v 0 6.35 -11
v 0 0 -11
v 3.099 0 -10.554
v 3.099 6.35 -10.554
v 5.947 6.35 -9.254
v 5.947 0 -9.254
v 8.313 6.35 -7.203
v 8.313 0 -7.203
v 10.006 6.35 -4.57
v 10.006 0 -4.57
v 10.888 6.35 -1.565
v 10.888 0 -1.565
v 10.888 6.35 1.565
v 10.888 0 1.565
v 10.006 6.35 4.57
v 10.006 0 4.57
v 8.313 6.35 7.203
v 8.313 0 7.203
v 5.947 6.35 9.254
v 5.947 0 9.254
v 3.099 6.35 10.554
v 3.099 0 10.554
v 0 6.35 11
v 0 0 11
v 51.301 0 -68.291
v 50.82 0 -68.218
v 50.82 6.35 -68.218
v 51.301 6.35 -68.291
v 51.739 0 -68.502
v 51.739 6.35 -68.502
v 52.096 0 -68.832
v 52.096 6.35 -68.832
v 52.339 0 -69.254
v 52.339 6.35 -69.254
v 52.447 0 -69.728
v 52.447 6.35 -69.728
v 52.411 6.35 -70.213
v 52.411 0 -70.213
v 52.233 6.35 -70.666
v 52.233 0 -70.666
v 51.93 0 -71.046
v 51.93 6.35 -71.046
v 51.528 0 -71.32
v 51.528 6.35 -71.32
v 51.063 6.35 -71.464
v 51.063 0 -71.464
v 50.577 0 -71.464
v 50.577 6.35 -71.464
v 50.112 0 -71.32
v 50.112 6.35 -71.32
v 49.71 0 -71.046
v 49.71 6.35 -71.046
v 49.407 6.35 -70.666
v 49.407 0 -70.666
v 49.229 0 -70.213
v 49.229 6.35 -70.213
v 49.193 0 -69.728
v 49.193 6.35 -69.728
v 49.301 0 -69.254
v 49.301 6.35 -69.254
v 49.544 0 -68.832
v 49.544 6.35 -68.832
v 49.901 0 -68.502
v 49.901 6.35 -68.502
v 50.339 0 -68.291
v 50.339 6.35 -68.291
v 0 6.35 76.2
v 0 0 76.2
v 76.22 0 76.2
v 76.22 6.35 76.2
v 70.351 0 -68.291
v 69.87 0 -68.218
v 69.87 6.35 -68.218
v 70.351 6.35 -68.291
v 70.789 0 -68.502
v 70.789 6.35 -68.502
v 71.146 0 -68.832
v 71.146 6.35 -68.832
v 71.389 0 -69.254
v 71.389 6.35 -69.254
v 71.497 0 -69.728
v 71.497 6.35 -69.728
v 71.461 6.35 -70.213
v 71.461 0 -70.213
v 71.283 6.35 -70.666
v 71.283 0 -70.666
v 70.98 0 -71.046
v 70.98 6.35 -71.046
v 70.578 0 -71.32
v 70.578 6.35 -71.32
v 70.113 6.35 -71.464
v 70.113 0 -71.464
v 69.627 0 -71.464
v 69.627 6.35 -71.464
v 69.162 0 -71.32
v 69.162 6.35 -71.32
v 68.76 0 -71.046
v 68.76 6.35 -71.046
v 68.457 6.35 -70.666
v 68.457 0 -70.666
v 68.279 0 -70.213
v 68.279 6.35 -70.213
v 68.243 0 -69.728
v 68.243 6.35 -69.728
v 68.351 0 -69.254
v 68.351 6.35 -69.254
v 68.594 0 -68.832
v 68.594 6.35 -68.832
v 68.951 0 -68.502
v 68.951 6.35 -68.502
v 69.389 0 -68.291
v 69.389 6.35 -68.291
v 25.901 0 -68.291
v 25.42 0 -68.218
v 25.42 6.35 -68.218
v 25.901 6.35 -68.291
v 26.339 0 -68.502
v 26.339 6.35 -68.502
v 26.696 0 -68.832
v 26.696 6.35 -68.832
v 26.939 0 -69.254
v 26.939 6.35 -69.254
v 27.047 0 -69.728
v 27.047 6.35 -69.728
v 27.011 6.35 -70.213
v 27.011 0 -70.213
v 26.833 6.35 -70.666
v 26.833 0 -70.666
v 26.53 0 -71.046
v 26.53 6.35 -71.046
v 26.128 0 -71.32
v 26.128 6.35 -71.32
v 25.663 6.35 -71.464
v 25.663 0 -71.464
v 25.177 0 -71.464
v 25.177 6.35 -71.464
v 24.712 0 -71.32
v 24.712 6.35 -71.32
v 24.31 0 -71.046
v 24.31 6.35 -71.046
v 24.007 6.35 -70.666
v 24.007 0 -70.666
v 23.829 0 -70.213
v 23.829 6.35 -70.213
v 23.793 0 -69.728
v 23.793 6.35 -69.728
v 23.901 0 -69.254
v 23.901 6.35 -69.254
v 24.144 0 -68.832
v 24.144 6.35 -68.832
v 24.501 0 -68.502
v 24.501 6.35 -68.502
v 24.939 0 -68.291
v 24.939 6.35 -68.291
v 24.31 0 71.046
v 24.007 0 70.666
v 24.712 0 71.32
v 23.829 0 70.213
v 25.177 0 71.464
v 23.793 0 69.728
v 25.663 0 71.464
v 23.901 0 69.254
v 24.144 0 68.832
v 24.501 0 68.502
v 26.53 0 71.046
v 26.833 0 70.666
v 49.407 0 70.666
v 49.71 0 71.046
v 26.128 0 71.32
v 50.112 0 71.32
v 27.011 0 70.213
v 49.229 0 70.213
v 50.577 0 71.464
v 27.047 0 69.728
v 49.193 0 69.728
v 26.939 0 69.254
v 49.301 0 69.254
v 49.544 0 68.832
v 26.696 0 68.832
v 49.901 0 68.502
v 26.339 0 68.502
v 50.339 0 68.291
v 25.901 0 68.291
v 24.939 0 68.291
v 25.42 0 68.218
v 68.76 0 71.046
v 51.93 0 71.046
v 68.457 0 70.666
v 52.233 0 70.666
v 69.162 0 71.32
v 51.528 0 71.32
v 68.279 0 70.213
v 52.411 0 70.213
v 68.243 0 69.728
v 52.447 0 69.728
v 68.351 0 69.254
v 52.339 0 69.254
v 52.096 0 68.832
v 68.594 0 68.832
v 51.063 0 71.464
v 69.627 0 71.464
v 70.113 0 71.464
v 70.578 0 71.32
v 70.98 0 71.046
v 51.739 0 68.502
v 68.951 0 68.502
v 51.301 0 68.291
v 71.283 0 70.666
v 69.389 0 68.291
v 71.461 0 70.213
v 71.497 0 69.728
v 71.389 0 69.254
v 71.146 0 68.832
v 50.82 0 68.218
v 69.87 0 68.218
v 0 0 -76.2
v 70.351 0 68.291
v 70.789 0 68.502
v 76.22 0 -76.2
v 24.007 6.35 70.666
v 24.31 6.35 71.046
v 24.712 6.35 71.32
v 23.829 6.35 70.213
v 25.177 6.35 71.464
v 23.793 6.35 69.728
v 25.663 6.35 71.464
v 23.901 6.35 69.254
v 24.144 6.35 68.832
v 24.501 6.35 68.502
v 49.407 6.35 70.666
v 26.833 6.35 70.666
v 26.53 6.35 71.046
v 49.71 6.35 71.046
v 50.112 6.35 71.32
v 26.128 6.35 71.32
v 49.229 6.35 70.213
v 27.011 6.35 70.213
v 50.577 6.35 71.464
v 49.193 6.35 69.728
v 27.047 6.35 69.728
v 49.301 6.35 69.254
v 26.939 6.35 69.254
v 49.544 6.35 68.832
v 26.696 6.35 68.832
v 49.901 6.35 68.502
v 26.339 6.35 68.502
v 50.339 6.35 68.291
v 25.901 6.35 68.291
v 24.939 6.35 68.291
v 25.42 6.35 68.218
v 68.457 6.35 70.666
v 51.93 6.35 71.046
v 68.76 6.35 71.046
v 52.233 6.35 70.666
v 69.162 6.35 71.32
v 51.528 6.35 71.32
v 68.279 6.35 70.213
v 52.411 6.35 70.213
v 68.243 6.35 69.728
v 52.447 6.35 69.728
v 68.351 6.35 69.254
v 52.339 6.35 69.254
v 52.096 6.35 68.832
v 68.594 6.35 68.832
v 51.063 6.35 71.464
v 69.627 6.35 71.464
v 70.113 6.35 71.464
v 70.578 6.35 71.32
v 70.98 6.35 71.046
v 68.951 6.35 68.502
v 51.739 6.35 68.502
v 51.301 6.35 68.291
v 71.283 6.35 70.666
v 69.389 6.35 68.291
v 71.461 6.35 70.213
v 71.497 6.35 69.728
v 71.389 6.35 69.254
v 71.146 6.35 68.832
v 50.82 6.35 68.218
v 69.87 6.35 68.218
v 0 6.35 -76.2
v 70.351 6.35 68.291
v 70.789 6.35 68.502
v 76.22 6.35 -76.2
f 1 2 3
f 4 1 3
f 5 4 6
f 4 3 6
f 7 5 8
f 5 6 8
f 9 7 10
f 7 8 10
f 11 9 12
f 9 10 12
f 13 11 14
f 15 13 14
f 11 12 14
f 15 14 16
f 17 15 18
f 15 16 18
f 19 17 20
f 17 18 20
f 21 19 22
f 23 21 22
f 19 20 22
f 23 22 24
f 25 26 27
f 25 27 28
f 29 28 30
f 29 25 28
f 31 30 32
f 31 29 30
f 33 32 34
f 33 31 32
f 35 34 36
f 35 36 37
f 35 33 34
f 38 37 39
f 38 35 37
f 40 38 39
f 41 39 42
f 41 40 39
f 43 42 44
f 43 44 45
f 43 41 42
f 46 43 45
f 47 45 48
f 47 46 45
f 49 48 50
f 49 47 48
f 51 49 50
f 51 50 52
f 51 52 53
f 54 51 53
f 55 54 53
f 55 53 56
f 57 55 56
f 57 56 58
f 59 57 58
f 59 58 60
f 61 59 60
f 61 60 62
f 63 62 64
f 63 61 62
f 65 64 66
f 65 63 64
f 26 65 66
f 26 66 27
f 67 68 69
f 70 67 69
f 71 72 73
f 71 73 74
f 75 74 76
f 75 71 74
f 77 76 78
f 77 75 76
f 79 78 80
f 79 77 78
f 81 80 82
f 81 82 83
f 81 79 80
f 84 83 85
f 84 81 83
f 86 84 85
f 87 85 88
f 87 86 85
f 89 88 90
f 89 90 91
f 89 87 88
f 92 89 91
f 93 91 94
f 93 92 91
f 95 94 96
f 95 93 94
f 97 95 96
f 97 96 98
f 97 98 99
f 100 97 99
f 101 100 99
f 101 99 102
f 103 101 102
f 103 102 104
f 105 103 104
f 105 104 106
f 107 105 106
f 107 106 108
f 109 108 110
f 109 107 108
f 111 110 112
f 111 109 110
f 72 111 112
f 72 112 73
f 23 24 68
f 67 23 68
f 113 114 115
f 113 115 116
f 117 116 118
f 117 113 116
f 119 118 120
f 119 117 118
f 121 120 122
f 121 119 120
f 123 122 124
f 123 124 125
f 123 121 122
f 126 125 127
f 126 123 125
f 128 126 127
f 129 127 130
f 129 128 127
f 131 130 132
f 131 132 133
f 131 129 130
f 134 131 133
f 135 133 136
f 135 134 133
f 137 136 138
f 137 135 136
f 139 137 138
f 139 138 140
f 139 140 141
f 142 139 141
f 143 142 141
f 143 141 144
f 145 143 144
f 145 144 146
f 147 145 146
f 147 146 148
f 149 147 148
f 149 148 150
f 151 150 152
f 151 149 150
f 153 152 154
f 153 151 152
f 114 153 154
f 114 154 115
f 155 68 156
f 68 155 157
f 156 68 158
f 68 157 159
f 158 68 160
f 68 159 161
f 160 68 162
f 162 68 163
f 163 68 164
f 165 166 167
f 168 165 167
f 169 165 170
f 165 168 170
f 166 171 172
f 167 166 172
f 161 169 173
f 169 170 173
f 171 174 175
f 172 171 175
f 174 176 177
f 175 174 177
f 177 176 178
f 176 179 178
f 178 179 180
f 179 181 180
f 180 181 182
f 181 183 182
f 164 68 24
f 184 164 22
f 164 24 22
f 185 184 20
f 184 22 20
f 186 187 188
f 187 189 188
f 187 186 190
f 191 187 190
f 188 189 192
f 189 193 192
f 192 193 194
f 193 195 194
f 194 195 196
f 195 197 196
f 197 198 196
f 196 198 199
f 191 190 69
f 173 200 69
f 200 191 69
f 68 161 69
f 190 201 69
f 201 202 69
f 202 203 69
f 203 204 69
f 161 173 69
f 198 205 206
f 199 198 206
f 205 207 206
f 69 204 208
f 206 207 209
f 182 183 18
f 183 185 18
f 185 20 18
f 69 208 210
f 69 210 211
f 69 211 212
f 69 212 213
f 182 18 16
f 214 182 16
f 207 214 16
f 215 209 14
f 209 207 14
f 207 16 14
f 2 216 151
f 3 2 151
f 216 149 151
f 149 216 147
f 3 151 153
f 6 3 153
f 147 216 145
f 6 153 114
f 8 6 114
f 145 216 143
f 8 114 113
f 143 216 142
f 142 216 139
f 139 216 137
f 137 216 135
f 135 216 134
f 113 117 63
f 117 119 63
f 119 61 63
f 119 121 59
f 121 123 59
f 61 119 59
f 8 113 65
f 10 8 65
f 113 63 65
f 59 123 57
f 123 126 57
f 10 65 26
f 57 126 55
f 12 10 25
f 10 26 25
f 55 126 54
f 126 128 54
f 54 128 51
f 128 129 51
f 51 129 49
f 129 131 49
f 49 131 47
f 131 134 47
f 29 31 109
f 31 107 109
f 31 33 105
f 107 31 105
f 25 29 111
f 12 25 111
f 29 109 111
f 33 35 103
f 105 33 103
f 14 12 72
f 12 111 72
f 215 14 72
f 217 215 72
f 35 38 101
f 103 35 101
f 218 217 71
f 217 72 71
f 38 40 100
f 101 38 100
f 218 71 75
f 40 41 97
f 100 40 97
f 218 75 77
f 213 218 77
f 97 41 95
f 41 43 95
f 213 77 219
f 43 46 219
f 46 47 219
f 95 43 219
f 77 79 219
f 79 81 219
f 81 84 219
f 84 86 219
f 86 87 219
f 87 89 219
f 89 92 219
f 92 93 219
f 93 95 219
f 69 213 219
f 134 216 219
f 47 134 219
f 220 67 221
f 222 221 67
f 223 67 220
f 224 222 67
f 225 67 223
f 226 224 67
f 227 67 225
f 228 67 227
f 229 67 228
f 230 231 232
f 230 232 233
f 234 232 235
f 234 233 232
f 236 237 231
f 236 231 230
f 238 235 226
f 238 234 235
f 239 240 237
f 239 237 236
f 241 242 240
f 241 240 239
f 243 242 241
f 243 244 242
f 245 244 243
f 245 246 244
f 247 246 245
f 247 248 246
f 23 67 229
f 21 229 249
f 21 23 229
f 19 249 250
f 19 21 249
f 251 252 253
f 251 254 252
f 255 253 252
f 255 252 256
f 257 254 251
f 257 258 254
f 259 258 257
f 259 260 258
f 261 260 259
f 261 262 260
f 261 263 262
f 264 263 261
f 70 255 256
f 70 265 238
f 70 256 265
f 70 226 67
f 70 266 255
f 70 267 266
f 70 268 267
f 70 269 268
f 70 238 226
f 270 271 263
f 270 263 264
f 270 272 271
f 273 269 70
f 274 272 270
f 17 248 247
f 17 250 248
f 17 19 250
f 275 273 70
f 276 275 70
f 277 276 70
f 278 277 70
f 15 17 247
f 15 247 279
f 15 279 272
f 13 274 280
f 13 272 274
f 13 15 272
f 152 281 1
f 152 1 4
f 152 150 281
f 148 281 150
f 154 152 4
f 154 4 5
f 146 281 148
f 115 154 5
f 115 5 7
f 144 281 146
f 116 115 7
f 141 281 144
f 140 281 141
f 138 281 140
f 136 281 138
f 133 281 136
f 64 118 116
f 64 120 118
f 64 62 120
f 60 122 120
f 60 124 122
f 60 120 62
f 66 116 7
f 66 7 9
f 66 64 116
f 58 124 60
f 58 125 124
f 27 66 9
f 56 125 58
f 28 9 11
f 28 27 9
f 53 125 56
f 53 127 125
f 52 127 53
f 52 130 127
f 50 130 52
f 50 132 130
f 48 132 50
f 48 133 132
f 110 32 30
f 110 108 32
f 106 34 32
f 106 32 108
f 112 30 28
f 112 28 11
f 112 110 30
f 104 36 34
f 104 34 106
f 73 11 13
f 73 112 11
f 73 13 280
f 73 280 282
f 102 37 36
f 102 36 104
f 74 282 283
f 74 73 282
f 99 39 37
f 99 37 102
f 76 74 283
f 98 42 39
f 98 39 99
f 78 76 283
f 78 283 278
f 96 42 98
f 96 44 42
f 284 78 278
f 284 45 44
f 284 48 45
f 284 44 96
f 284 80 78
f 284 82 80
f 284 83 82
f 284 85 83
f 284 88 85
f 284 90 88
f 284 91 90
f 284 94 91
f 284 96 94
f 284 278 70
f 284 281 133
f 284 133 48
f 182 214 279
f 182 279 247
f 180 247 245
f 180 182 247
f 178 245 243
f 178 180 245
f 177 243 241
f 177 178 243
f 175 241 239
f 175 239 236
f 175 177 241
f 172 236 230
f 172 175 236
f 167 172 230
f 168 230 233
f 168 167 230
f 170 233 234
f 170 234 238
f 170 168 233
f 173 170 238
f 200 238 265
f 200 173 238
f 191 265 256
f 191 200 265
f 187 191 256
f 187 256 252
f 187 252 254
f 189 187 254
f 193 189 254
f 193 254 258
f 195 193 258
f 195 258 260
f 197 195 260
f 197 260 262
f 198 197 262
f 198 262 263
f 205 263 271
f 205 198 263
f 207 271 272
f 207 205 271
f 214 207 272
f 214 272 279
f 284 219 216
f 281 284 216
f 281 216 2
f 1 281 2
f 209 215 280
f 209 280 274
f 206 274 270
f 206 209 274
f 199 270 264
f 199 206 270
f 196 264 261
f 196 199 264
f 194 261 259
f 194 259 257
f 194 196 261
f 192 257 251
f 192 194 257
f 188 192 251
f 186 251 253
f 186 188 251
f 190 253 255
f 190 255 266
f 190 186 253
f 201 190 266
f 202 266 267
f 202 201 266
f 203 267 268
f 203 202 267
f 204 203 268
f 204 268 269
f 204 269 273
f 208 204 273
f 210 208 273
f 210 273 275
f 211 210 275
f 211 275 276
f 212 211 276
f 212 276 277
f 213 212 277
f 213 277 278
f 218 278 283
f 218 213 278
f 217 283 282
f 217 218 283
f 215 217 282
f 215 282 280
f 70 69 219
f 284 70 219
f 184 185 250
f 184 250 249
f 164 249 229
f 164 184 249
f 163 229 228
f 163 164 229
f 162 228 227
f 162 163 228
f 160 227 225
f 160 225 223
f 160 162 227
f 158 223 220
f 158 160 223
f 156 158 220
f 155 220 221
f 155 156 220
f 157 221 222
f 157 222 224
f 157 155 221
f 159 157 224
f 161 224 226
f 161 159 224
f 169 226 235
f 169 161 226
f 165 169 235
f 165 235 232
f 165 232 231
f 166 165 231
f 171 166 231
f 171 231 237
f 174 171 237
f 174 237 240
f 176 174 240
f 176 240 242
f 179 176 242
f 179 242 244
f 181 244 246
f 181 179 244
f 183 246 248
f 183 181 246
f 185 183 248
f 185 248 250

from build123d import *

# Parameters (mm, degrees)
SKETCH1_R           = 1.63195
BOSS_EXTRUDE1_DEPTH = 6.35


with BuildPart() as part:
    # Sketch1 → Boss-Extrude1 (new body)
    with BuildSketch(Plane(origin=(0, 0, 0), x_dir=(1, 0, 0), z_dir=(0, 1, 0))):
        with BuildLine():
            Line((0, -11), (0, -76.2))
            Line((0, -76.2), (76.22, -76.2))
            Line((76.22, -76.2), (76.22, 76.2))
            Line((76.22, 76.2), (0, 76.2))
            Line((0, 76.2), (0, 11))
            ThreePointArc((0, 11), (11, 0), (0, -11))
        make_face()
        with Locations(Location((69.87, 69.85, 0), (0, 0, 270))):
            Circle(SKETCH1_R, mode=Mode.SUBTRACT)
        with Locations(Location((69.87, -69.85, 0), (0, 0, 90))):
            Circle(SKETCH1_R, mode=Mode.SUBTRACT)
        with Locations(Location((50.82, 69.85, 0), (0, 0, 270))):
            Circle(SKETCH1_R, mode=Mode.SUBTRACT)
        with Locations(Location((25.42, 69.85, 0), (0, 0, 270))):
            Circle(SKETCH1_R, mode=Mode.SUBTRACT)
        with Locations(Location((50.82, -69.85, 0), (0, 0, 90))):
            Circle(SKETCH1_R, mode=Mode.SUBTRACT)
        with Locations(Location((25.42, -69.85, 0), (0, 0, 90))):
            Circle(SKETCH1_R, mode=Mode.SUBTRACT)
    extrude(amount=BOSS_EXTRUDE1_DEPTH)


solid = part.part
